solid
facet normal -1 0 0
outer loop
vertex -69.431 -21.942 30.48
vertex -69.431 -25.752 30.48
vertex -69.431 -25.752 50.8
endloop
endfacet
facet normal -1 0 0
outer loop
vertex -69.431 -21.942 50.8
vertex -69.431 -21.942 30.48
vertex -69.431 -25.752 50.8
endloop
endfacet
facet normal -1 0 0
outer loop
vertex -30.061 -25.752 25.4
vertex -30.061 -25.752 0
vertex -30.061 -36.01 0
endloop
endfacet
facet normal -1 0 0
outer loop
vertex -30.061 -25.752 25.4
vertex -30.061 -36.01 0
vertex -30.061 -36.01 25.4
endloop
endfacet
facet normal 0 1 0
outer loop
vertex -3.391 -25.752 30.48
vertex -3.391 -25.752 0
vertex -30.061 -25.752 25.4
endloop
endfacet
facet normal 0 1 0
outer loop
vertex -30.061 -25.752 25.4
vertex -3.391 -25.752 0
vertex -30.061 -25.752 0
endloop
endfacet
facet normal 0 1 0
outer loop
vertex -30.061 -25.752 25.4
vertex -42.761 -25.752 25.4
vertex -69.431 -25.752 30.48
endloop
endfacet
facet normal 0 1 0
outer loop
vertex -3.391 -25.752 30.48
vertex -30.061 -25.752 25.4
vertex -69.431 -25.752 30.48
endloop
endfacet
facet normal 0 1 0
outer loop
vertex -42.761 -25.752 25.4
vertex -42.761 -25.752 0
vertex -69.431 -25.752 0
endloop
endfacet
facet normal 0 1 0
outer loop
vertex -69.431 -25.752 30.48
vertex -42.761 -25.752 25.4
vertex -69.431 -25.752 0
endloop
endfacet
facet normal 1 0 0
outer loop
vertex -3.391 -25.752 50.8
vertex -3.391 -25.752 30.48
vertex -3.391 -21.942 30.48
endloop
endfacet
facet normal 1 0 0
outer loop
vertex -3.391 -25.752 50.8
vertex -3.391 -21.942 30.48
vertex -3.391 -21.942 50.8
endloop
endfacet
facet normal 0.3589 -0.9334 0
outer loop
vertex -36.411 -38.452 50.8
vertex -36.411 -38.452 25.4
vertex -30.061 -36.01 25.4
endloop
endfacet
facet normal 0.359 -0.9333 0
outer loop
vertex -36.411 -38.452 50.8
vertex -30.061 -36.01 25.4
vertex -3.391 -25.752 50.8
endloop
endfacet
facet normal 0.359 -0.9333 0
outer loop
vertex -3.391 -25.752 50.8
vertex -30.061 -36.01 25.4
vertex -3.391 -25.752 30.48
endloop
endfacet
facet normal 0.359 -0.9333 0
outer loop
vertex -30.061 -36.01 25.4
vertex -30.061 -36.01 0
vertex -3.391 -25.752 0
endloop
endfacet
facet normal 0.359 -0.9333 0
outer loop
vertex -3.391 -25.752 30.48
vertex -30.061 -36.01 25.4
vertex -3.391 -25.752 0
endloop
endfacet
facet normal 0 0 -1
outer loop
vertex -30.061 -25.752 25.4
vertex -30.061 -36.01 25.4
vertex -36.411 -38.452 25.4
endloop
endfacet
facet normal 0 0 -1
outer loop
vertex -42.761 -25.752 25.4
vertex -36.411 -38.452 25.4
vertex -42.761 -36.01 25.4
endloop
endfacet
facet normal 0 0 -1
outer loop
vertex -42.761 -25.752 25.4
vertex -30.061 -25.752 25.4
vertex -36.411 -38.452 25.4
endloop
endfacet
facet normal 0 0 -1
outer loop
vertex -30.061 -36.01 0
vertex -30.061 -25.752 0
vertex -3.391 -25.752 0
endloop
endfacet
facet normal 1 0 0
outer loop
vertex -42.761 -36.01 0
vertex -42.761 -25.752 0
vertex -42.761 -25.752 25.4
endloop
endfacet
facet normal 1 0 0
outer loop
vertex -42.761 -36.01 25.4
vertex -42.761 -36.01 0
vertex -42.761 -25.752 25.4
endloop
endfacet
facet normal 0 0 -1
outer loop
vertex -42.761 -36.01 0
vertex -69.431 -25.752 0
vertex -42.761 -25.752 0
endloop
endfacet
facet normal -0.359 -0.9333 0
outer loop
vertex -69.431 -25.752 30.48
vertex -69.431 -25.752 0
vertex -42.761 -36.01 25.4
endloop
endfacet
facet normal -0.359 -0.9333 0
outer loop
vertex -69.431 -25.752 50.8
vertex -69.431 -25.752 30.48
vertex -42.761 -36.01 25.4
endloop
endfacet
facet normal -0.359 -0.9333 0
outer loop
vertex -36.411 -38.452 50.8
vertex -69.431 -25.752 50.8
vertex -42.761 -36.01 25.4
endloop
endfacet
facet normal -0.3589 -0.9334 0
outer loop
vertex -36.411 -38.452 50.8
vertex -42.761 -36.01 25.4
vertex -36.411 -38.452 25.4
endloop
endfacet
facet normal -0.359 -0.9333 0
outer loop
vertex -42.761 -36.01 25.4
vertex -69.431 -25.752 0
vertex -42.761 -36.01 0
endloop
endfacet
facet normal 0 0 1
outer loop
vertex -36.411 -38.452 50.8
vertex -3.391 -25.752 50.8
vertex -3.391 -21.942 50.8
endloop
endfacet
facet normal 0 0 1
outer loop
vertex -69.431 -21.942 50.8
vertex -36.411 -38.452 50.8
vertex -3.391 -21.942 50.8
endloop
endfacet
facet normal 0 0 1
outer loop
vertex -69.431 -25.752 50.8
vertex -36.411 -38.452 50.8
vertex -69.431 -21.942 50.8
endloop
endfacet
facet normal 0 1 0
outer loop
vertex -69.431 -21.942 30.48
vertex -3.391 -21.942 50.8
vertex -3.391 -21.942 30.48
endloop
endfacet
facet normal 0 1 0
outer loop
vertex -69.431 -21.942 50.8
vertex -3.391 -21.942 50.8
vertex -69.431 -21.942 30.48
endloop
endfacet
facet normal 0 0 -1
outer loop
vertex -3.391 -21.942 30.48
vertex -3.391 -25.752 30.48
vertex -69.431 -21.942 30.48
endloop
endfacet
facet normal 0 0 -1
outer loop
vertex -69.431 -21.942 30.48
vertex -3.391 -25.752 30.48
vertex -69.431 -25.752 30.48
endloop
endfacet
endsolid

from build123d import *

# Parameters (mm, degrees)
F1_DEPTH = 50.8
F2_W     = 12.7
F2_H     = 25.4
F3_DEPTH = 25.4
F4_W     = 66.04
F4_H     = 20.32
F5_DEPTH = 3.81


# Not quite as in the source:
# - a feature names something its author has since deleted; it is built from what else it names


with BuildPart() as f1:
    # F0 (on Top) → F1 (new body)
    with BuildSketch(Plane.XY):
        Polygon((-3.3912816751, -25.752466172), (-69.4312816751, -25.752466172), (-36.4112816751, -38.452466172), align=None)
    extrude(amount=F1_DEPTH)

    # F2 (on face) → F3 (cut)
    with BuildSketch(Plane(origin=(0, -25.752466172, 0), x_dir=(-1, 0, 0), z_dir=(0, 1, 0))):
        with Locations((36.4112816751, 12.7)):
            Rectangle(F2_W, F2_H)
    extrude(amount=-F3_DEPTH, mode=Mode.SUBTRACT)

    # F4 (on face) → F5 (join)
    with BuildSketch(Plane(origin=(0, -25.752466172, 0), x_dir=(-1, 0, 0), z_dir=(0, 1, 0))):
        with Locations((36.4112816751, 40.64)):
            Rectangle(F4_W, F4_H)
    extrude(amount=F5_DEPTH)


solid = f1.part
